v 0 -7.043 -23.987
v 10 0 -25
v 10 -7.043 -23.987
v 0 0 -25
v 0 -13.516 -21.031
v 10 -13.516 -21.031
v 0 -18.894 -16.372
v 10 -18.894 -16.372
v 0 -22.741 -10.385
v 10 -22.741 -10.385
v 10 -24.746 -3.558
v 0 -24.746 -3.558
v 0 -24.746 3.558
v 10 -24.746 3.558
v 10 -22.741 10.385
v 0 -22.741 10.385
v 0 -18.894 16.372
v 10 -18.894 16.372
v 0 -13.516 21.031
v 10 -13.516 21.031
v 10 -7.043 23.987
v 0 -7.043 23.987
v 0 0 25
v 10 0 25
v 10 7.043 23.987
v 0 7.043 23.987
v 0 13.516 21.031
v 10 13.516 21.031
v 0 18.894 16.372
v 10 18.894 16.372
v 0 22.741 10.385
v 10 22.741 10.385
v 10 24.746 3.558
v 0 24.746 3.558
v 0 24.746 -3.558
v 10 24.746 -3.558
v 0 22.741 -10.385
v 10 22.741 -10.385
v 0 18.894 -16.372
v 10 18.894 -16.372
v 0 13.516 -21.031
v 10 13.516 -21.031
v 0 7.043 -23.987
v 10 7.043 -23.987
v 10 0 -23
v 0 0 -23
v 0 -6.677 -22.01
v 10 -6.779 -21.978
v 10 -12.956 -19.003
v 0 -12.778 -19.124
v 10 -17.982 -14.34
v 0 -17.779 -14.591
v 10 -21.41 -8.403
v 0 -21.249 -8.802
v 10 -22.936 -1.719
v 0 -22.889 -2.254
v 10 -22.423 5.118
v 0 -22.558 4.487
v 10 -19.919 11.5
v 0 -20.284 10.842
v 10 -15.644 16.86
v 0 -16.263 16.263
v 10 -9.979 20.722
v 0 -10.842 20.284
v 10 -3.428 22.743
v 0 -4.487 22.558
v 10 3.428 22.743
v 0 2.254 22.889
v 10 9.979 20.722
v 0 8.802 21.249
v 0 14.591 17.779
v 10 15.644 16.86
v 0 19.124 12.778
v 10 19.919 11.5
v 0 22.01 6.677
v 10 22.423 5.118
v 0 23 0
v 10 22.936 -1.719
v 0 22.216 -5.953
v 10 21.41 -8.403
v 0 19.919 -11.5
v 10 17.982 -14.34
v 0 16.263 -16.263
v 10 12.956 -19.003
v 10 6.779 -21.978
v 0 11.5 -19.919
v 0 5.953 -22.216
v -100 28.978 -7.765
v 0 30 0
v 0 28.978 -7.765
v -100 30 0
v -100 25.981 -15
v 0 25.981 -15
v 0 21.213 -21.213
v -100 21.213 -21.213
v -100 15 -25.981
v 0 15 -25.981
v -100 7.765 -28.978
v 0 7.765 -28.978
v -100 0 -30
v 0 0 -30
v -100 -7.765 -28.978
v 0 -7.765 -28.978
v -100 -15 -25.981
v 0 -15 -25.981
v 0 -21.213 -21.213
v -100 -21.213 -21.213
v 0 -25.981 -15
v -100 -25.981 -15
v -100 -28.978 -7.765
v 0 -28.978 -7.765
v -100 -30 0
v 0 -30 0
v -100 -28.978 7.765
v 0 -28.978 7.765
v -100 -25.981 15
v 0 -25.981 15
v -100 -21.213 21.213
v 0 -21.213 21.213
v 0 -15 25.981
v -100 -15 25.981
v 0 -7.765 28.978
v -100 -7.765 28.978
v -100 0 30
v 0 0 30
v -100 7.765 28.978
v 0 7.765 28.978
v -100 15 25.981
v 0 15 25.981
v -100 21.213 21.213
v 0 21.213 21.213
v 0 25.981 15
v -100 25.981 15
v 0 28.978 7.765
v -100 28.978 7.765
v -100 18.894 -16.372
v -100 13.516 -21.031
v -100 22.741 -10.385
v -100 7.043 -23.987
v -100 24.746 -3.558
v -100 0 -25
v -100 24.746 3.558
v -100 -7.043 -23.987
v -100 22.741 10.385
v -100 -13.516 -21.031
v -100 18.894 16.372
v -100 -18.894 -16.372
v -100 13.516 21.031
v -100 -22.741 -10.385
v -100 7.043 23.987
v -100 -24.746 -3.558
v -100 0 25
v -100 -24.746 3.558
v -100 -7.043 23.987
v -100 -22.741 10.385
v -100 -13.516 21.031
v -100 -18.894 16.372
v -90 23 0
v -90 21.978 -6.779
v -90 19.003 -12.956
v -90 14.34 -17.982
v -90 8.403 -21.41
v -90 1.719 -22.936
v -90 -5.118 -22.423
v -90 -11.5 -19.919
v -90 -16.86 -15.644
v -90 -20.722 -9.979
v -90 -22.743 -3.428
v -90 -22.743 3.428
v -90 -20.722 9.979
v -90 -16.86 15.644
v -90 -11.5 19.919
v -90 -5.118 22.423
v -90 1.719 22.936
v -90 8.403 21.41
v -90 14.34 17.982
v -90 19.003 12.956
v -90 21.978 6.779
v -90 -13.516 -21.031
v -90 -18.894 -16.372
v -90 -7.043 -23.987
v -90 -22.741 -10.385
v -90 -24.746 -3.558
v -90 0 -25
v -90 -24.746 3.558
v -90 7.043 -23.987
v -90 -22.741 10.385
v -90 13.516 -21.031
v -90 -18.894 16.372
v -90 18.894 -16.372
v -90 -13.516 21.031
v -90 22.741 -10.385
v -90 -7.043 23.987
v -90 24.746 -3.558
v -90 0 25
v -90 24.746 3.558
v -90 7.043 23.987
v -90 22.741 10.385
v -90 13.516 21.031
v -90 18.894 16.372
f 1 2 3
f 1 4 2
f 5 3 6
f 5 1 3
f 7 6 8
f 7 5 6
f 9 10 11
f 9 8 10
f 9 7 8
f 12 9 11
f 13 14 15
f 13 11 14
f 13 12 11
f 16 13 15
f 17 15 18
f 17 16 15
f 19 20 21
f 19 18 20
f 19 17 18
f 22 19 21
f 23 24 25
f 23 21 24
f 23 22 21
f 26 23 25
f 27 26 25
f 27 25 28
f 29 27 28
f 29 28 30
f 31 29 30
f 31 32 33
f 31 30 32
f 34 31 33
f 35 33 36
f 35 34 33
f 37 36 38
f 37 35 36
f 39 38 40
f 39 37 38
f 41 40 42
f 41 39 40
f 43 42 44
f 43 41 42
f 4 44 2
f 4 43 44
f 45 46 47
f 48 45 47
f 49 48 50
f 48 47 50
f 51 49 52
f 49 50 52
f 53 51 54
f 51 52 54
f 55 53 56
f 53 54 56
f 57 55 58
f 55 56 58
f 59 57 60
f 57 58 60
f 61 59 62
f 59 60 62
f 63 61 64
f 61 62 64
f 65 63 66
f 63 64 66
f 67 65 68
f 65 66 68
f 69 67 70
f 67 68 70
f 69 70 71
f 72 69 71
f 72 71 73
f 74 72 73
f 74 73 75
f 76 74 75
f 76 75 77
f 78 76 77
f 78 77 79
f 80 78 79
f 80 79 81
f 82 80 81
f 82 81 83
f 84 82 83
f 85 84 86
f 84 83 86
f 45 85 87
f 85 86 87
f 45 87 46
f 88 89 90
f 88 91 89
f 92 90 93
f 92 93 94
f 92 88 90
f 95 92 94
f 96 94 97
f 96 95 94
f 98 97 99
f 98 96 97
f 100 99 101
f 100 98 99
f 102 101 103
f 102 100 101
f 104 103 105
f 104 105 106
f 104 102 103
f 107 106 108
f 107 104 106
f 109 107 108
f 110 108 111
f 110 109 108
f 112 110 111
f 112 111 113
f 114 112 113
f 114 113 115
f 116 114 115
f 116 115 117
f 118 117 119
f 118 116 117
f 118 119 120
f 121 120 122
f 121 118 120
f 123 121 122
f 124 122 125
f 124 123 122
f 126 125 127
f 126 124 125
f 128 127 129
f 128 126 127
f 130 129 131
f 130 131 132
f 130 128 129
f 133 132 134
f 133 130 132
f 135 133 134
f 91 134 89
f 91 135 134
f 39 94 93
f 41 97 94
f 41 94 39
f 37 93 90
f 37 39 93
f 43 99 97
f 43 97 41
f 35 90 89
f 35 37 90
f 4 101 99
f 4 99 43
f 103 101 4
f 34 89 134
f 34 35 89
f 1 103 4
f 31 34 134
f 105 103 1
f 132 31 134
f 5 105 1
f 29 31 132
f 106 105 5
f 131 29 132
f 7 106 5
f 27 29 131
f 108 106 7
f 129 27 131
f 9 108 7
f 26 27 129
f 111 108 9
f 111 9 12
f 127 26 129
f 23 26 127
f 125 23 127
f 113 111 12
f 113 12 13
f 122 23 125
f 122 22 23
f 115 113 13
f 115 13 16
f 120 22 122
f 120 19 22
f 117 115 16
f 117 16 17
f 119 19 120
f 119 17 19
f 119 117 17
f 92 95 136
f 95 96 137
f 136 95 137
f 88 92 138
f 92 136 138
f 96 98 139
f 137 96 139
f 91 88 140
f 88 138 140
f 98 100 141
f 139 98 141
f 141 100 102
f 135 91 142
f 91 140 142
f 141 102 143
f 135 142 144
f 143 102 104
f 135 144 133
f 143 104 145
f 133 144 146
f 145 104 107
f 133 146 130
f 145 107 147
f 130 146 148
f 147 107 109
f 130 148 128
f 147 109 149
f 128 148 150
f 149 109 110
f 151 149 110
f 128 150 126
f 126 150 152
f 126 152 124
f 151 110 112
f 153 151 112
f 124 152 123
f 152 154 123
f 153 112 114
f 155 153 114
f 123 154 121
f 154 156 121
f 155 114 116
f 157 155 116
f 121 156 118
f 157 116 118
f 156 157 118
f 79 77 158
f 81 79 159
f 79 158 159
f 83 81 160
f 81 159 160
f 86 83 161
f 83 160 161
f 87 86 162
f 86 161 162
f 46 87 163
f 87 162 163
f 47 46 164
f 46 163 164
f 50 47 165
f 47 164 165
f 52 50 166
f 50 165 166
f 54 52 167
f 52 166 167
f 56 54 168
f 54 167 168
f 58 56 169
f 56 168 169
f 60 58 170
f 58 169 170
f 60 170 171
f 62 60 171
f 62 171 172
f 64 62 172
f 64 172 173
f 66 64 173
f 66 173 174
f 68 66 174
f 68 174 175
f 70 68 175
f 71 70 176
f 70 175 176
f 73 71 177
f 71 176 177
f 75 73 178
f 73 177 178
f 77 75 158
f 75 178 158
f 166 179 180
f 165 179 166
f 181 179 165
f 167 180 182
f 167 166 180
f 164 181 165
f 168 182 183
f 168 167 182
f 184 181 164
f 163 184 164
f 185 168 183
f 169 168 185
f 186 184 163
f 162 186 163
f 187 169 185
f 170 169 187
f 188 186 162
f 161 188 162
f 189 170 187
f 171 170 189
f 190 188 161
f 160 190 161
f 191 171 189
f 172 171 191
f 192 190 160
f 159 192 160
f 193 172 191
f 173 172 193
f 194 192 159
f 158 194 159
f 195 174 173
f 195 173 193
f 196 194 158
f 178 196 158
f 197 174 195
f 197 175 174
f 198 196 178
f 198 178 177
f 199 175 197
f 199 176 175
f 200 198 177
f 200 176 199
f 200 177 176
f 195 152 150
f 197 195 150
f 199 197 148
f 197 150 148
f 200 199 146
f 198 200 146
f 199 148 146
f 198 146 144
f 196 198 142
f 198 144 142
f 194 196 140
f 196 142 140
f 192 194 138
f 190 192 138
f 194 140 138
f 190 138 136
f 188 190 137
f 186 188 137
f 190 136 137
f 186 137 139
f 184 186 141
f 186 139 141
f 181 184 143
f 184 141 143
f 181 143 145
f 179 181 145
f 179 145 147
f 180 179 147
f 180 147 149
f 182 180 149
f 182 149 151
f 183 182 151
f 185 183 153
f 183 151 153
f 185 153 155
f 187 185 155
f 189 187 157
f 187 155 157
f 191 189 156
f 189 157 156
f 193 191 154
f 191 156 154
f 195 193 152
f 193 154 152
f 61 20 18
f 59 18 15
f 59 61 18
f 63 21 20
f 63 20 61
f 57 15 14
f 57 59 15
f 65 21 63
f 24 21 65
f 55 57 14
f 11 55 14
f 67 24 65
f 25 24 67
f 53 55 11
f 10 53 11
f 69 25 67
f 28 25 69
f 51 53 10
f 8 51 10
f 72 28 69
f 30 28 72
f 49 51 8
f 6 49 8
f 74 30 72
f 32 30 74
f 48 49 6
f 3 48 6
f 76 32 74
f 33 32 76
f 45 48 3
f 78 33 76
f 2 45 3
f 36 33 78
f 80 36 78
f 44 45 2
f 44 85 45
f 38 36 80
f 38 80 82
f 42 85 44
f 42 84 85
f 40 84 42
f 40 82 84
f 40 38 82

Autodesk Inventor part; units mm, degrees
ref_plane "YZ Plane" through (0, 0, 0) normal (1, 0, 0) x (0, 1, 0)
ref_plane "XZ Plane" through (0, 0, 0) normal (0, 1, 0) x (-1, 0, 0)
ref_plane "XY Plane" through (0, 0, 0) normal (0, 0, 1) x (1, 0, 0)
sketch "Esquisse9" plane through (0, 0, 0) normal (0, 1, 0) x (-1, 0, 0)
  line L0 (0, 0) -> (100, 0)
  line L1 (120, 0) -> (-20, 0) construction
  dimension "d20" = 100
sketch "Esquisse10" plane through (0, 0, 0) normal (1, 0, 0) x (0, 1, 0)
  circle A0 centre (0, 0) radius 30
  circle A1 centre (0, 0) radius 23
  dimension "d22" = 60
  dimension "d23" = 46
sweep "Balayage2" add profiles "Esquisse10" path "Esquisse9"
sketch "Esquisse11" plane through (0, 0, 0) normal (1, 0, 0) x (0, 0, -1)
  circle A0 centre (0, 0) radius 23 construction
  circle A1 centre (0, 0) radius 30 construction
  circle A2 centre (0, 0) radius 23
  circle A3 centre (0, 0) radius 25
  dimension "d26" = 50
extrude "Extrusion4" add sketch "Esquisse11" along normal blind 10
sketch "Esquisse15" plane through (-100, 0, 0) normal (-1, 0, 0) x (0, 0, 1)
  circle A0 centre (0, 0) radius 23
  circle A1 centre (0, 0) radius 25
  dimension "d41" = 46
  dimension "d42" = 50
extrude "Extrusion6" cut sketch "Esquisse15" against normal blind 10
properties part number "P008_CanonBout"
